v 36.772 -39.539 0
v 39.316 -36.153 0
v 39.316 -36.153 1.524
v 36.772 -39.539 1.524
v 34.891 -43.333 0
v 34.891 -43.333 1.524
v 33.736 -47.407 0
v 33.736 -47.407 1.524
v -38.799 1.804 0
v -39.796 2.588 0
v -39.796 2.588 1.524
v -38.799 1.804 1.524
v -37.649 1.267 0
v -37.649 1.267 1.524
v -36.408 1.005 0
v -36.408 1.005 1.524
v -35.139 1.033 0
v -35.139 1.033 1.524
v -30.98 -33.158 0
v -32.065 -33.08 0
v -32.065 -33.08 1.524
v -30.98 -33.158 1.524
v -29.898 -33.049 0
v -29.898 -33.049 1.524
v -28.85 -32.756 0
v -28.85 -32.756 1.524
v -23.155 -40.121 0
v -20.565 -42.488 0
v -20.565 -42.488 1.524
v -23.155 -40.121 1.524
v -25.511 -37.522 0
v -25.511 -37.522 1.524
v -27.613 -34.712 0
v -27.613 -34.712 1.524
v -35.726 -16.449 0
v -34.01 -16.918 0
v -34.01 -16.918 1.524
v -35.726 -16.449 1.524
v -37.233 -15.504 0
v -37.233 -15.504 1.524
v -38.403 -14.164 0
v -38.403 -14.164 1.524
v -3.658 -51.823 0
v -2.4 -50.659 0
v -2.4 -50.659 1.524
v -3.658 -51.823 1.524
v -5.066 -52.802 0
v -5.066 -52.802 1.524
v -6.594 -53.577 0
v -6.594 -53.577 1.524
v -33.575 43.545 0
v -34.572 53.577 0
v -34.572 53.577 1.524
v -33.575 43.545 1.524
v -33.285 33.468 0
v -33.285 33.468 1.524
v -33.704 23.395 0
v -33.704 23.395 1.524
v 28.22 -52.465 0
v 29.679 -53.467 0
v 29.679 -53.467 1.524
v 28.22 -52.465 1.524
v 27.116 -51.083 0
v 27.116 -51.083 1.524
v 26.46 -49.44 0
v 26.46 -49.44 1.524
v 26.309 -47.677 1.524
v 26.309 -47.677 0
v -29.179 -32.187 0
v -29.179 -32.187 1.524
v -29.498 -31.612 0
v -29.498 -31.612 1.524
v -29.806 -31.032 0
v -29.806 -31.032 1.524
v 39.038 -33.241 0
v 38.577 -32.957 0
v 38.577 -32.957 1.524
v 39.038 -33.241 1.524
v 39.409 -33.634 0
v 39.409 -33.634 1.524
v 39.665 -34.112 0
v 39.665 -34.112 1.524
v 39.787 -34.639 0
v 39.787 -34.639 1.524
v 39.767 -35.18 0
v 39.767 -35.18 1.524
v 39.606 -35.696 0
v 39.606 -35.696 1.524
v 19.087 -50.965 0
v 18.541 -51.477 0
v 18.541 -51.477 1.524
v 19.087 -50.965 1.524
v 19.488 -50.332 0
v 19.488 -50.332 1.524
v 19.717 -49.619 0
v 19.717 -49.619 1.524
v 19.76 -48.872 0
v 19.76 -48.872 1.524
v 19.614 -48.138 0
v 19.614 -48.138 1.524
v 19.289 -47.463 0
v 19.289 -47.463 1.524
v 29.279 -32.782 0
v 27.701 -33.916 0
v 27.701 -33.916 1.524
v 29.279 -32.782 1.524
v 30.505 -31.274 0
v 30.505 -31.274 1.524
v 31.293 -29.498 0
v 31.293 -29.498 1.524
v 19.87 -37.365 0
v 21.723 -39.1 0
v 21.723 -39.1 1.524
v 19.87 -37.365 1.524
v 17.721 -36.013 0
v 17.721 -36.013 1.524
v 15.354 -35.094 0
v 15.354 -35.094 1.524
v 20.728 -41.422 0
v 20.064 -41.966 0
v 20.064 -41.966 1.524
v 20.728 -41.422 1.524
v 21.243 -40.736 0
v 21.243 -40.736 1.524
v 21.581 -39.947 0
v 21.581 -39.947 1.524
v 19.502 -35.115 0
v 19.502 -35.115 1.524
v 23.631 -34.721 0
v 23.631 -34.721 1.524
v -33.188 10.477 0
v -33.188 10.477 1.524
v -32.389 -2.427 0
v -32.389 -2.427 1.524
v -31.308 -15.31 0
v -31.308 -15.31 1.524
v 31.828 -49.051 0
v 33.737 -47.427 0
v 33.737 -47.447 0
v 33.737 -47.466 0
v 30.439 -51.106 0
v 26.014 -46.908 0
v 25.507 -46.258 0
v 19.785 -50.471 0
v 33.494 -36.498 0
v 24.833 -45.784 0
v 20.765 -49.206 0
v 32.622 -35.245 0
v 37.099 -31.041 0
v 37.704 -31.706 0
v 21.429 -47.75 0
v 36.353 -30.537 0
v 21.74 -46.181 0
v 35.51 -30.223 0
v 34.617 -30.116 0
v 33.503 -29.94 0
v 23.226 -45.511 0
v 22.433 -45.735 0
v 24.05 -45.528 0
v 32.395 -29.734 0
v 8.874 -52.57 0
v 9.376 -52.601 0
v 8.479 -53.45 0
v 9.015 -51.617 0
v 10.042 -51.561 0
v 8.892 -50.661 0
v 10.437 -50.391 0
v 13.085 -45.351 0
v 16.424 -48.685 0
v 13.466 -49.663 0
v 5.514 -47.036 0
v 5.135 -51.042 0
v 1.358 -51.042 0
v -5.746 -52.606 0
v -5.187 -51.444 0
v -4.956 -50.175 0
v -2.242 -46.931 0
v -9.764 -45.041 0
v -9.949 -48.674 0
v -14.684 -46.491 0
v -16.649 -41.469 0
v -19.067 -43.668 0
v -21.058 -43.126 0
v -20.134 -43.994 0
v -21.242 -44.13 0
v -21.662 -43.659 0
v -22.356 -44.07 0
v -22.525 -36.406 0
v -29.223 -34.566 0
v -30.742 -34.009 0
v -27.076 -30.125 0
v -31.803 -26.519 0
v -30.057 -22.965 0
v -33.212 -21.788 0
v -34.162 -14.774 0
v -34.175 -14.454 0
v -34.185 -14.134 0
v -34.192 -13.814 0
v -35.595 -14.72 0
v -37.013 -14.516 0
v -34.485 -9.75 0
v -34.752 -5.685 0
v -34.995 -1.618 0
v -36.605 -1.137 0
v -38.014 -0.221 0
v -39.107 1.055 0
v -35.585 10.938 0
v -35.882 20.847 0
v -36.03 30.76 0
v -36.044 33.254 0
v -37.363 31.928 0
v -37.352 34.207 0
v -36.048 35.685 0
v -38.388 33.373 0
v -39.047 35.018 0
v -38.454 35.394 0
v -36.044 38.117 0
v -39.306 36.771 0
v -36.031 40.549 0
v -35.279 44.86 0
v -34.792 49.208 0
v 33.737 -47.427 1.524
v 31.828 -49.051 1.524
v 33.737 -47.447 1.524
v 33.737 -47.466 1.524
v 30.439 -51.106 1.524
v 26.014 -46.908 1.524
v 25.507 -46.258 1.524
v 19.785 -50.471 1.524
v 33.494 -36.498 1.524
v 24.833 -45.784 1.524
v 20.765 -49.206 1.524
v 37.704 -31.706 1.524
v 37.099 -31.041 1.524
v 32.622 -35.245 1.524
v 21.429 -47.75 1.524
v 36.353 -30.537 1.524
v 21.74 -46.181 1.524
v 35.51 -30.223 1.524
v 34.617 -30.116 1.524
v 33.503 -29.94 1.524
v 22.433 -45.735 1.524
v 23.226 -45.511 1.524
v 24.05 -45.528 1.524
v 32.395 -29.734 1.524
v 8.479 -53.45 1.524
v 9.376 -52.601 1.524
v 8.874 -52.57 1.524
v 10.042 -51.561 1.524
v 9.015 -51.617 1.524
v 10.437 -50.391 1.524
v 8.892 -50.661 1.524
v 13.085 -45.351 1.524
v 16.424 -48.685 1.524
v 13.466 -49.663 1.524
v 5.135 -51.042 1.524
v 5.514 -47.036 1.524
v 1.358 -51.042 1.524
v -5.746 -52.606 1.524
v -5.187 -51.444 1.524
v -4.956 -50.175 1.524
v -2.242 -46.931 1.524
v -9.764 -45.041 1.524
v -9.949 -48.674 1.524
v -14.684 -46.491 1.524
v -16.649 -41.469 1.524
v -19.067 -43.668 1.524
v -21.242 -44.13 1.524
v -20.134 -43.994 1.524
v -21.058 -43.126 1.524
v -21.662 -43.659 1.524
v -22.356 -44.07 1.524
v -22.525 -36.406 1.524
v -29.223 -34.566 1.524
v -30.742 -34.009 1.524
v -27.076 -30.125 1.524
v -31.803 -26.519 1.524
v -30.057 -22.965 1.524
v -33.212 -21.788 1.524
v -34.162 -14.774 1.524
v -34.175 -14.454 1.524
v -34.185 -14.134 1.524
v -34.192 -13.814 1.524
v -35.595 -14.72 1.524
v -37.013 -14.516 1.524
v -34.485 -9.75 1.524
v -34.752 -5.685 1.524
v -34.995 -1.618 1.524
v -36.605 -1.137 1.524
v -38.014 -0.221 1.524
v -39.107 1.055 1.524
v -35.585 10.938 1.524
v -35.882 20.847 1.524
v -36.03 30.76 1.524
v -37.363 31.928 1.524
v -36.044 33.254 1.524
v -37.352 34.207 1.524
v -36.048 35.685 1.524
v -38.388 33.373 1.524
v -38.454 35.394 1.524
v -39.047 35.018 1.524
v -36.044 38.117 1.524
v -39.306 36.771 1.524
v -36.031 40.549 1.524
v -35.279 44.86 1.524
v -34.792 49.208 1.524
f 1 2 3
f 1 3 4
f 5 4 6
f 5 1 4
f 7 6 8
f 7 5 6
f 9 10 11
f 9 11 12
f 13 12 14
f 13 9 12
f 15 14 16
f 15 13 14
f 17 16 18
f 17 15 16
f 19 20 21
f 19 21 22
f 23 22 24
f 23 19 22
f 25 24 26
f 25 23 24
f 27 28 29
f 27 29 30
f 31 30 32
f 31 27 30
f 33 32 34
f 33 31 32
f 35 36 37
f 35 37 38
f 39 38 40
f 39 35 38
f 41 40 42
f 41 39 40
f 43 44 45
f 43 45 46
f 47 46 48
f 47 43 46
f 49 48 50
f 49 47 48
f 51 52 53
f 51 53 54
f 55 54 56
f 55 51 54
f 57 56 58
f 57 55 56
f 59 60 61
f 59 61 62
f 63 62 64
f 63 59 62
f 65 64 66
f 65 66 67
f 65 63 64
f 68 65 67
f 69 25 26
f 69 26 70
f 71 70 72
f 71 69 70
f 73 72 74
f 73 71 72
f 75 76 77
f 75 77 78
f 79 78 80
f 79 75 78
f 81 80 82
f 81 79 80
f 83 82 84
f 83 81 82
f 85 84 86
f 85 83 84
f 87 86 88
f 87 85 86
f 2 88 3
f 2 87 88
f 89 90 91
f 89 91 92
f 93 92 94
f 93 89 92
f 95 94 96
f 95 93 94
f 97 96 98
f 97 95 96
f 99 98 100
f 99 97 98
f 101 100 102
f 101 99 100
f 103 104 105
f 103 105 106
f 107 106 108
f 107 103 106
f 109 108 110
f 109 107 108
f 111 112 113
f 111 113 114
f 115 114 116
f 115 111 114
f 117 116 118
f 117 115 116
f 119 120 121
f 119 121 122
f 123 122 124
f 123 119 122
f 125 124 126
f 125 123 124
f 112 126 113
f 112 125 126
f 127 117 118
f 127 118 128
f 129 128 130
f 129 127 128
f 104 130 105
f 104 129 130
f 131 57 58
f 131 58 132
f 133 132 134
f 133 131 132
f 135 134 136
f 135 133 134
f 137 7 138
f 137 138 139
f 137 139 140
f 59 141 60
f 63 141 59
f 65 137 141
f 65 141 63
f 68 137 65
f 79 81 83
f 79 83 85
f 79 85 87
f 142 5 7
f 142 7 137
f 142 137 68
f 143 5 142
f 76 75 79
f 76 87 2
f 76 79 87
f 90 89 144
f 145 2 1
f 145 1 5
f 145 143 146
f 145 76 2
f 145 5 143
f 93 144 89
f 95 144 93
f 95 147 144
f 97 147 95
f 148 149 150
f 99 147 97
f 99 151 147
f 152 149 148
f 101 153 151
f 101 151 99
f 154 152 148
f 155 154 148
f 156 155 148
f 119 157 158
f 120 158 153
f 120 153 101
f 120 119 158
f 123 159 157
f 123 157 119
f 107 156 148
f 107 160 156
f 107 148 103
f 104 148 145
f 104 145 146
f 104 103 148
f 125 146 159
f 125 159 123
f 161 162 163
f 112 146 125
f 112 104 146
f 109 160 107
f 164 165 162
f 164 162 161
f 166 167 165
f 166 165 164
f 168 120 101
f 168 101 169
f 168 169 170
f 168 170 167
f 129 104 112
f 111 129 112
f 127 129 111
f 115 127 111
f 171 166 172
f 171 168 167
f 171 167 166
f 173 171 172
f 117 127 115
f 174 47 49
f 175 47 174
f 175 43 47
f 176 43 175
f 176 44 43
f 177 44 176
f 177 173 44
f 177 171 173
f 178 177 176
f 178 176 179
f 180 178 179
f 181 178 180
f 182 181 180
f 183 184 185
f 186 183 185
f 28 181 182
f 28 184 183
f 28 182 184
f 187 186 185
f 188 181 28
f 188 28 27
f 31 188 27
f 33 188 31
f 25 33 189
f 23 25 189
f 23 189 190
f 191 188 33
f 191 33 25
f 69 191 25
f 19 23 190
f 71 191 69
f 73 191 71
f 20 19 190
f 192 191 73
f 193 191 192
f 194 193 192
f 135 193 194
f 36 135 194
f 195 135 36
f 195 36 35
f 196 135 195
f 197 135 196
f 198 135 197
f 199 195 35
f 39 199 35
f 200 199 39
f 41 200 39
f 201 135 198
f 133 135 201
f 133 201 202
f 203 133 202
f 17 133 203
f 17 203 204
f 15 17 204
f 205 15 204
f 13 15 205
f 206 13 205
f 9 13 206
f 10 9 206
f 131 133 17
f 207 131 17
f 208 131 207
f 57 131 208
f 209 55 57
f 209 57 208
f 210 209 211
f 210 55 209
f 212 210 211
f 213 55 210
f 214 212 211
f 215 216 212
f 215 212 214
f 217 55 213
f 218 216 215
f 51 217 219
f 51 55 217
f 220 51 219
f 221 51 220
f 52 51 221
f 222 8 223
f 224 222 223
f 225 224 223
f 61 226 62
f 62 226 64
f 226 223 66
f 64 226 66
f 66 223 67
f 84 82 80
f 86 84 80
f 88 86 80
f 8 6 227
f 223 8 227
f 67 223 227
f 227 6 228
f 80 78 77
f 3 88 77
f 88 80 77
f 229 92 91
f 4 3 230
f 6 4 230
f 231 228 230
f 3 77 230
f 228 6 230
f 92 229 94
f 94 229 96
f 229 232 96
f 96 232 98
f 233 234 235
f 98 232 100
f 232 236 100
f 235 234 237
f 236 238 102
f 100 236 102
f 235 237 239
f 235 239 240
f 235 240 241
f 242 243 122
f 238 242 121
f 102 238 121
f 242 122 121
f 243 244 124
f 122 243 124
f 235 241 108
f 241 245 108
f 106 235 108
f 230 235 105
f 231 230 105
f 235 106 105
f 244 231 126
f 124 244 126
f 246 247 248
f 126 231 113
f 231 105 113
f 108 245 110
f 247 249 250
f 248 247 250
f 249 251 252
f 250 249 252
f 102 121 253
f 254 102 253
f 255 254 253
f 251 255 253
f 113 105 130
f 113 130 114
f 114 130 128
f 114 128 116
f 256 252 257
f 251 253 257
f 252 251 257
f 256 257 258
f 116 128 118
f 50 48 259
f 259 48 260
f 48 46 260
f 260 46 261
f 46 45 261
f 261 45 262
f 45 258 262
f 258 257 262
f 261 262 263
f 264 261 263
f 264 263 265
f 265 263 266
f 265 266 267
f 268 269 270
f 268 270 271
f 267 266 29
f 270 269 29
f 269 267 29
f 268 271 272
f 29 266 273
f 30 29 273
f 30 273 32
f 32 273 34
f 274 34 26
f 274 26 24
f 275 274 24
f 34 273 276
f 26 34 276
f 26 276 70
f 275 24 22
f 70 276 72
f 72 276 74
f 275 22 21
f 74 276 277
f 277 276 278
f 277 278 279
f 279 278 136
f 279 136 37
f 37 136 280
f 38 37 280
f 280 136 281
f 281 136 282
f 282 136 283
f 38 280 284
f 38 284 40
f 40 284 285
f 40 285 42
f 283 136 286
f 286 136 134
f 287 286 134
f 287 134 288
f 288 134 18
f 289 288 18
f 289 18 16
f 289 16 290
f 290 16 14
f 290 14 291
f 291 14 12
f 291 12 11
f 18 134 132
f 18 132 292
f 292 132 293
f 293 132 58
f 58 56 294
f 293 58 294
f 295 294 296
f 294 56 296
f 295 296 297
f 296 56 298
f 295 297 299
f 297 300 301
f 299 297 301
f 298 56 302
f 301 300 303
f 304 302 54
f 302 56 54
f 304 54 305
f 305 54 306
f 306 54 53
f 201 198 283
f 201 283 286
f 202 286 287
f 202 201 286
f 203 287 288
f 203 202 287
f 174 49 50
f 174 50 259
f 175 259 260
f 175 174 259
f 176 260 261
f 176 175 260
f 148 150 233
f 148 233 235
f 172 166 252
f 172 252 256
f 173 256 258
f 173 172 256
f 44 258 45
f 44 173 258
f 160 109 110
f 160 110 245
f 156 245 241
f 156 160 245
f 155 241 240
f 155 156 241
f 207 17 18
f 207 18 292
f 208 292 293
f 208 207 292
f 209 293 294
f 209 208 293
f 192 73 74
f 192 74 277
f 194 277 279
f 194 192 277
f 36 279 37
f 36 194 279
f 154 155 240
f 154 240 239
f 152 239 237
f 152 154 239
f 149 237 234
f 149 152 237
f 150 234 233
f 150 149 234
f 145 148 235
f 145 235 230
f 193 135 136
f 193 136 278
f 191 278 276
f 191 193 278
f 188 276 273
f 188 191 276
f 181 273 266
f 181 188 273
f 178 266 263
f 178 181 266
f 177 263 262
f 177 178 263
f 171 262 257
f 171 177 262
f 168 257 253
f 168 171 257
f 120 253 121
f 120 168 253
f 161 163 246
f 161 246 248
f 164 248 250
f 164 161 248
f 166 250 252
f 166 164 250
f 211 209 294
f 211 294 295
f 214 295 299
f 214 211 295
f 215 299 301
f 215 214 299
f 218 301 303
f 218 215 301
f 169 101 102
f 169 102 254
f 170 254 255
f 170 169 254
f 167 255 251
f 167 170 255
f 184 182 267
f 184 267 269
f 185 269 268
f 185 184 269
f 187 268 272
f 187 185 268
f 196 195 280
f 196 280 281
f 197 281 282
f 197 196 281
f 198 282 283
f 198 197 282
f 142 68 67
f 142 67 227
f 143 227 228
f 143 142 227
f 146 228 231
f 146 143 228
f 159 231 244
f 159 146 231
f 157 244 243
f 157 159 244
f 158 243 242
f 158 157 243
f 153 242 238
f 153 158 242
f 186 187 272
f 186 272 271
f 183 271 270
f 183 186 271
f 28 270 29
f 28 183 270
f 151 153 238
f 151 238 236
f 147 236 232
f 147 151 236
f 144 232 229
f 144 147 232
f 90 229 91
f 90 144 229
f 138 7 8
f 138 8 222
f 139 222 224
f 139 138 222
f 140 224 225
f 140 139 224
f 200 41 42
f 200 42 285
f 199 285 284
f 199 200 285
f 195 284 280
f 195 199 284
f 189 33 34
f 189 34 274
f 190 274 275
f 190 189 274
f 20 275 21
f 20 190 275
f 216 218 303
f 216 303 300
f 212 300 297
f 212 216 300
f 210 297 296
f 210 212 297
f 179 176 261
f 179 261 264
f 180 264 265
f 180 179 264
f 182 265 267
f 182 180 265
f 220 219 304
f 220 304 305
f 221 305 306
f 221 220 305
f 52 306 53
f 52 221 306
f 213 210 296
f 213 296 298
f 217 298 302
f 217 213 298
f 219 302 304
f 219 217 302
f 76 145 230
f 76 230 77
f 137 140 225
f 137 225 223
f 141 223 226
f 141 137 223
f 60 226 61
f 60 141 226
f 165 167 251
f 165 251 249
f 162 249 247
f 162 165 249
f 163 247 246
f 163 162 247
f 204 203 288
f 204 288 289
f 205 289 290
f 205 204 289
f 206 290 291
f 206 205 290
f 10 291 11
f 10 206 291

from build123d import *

# Parameters (mm, degrees)
BOSS_EXTRUDE1_DEPTH = 1.524


with BuildPart() as part:
    # Sketch1 → Boss-Extrude1 (new body)
    with BuildSketch(Plane.XY):
        with BuildLine():
            Line((37.704296416, -31.705702494), (32.621666071, -35.245462588))
            Line((32.621666071, -35.245462588), (33.493939306, -36.4982372))
            Line((33.493939306, -36.4982372), (38.576569651, -32.957484201))
            ThreePointArc((38.576569651, -32.957484201), (39.742986246, -34.371130843), (39.316039794, -36.153444291))
            ThreePointArc((39.316039794, -36.153444291), (35.743862713, -41.392315435), (33.736249861, -47.406940162))
            ThreePointArc((33.736249861, -47.406940162), (33.736605397, -47.436618983), (33.736723912, -47.466299698))
            ThreePointArc((33.736723912, -47.466299698), (31.060825363, -50.029100651), (29.678991539, -53.46696584))
            ThreePointArc((29.678991539, -53.46696584), (27.115500093, -51.083388449), (26.30925741, -47.677085129))
            ThreePointArc((26.30925741, -47.677085129), (24.451153983, -45.627042683), (21.740362101, -46.180964831))
            ThreePointArc((21.740362101, -46.180964831), (20.76513964, -49.206145699), (18.541417724, -51.477233316))
            ThreePointArc((18.541417724, -51.477233316), (19.716696181, -49.619411518), (19.289312359, -47.462996819))
            ThreePointArc((19.289312359, -47.462996819), (14.95515305, -49.204688548), (10.437184098, -50.390598976))
            ThreePointArc((10.437184098, -50.390598976), (9.740523804, -52.101024231), (8.47892764, -53.449825638))
            ThreePointArc((8.47892764, -53.449825638), (8.977567303, -52.098435339), (8.892067822, -50.66052467))
            ThreePointArc((8.892067822, -50.66052467), (3.246101629, -51.089737509), (-2.399729403, -50.658750414))
            ThreePointArc((-2.399729403, -50.658750414), (-4.344989088, -52.336657488), (-6.594422726, -53.577405529))
            ThreePointArc((-6.594422726, -53.577405529), (-5.427176524, -52.043650888), (-4.956013668, -50.174728054))
            ThreePointArc((-4.956013668, -50.174728054), (-12.354481608, -47.665032068), (-19.067256704, -43.668214296))
            ThreePointArc((-19.067256704, -43.668214296), (-20.685168003, -44.086118721), (-22.356101471, -44.069919276))
            ThreePointArc((-22.356101471, -44.069919276), (-21.34731349, -43.406825821), (-20.564738203, -42.48762941))
            ThreePointArc((-20.564738203, -42.48762941), (-24.363722181, -38.849120016), (-27.612631699, -34.712017549))
            ThreePointArc((-27.612631699, -34.712017549), (-30.00052566, -34.336897034), (-32.065024234, -33.079678433))
            ThreePointArc((-32.065024234, -33.079678433), (-30.436493757, -33.12678938), (-28.850067174, -32.755869369))
            ThreePointArc((-28.850067174, -32.755869369), (-29.339652087, -31.900308765), (-29.806440493, -31.032100312))
            ThreePointArc((-29.806440493, -31.032100312), (-32.582725704, -24.1759064), (-34.009509312, -16.917845842))
            ThreePointArc((-34.009509312, -16.917845842), (-36.514142372, -16.032312472), (-38.402522283, -14.16378968))
            ThreePointArc((-38.402522283, -14.16378968), (-36.306570998, -14.636822999), (-34.162260401, -14.773586932))
            ThreePointArc((-34.162260401, -14.773586932), (-34.180156343, -14.293685665), (-34.192120126, -13.813599883))
            ThreePointArc((-34.192120126, -13.813599883), (-34.621527317, -7.717500789), (-34.994580248, -1.617693725))
            ThreePointArc((-34.994580248, -1.617693725), (-38.013814487, -0.220962087), (-39.79584853, 2.588128395))
            ThreePointArc((-39.79584853, 2.588128395), (-37.649043689, 1.2668877), (-35.139082483, 1.033343809))
            ThreePointArc((-35.139082483, 1.033343809), (-35.751631039, 15.891841194), (-36.02990482, 30.760355712))
            ThreePointArc((-36.02990482, 30.760355712), (-38.387515912, 33.373438153), (-39.306278852, 36.770849603))
            ThreePointArc((-39.306278852, 36.770849603), (-37.931736179, 34.774118143), (-36.043826919, 33.253558144))
            ThreePointArc((-36.043826919, 33.253558144), (-36.047258198, 36.901464596), (-36.030566217, 40.549334472))
            ThreePointArc((-36.030566217, 40.549334472), (-35.002266591, 47.029894856), (-34.571956243, 53.577405529))
            ThreePointArc((-34.571956243, 53.577405529), (-33.341283224, 38.509314077), (-33.703754569, 23.395394975))
            ThreePointArc((-33.703754569, 23.395394975), (-32.823671192, 4.023096585), (-31.30799989, -15.309860564))
            ThreePointArc((-31.30799989, -15.309860564), (-13.310528761, -43.455618792), (20.06424012, -41.96649978))
            ThreePointArc((20.06424012, -41.96649978), (21.243050758, -40.73566209), (21.723238049, -39.10043241))
            ThreePointArc((21.723238049, -39.10043241), (18.8276625, -36.637371423), (15.353729803, -35.093733252))
            ThreePointArc((15.353729803, -35.093733252), (21.571557105, -34.969630573), (27.700749295, -33.916169174))
            ThreePointArc((27.700749295, -33.916169174), (29.941679247, -32.068657032), (31.293105646, -29.497914951))
            ThreePointArc((31.293105646, -29.497914951), (32.948684374, -29.840980808), (34.616890834, -30.116157682))
            ThreePointArc((34.616890834, -30.116157682), (36.353174649, -30.536876005), (37.704296416, -31.705702494))
        make_face()
    extrude(amount=BOSS_EXTRUDE1_DEPTH)


solid = part.part
